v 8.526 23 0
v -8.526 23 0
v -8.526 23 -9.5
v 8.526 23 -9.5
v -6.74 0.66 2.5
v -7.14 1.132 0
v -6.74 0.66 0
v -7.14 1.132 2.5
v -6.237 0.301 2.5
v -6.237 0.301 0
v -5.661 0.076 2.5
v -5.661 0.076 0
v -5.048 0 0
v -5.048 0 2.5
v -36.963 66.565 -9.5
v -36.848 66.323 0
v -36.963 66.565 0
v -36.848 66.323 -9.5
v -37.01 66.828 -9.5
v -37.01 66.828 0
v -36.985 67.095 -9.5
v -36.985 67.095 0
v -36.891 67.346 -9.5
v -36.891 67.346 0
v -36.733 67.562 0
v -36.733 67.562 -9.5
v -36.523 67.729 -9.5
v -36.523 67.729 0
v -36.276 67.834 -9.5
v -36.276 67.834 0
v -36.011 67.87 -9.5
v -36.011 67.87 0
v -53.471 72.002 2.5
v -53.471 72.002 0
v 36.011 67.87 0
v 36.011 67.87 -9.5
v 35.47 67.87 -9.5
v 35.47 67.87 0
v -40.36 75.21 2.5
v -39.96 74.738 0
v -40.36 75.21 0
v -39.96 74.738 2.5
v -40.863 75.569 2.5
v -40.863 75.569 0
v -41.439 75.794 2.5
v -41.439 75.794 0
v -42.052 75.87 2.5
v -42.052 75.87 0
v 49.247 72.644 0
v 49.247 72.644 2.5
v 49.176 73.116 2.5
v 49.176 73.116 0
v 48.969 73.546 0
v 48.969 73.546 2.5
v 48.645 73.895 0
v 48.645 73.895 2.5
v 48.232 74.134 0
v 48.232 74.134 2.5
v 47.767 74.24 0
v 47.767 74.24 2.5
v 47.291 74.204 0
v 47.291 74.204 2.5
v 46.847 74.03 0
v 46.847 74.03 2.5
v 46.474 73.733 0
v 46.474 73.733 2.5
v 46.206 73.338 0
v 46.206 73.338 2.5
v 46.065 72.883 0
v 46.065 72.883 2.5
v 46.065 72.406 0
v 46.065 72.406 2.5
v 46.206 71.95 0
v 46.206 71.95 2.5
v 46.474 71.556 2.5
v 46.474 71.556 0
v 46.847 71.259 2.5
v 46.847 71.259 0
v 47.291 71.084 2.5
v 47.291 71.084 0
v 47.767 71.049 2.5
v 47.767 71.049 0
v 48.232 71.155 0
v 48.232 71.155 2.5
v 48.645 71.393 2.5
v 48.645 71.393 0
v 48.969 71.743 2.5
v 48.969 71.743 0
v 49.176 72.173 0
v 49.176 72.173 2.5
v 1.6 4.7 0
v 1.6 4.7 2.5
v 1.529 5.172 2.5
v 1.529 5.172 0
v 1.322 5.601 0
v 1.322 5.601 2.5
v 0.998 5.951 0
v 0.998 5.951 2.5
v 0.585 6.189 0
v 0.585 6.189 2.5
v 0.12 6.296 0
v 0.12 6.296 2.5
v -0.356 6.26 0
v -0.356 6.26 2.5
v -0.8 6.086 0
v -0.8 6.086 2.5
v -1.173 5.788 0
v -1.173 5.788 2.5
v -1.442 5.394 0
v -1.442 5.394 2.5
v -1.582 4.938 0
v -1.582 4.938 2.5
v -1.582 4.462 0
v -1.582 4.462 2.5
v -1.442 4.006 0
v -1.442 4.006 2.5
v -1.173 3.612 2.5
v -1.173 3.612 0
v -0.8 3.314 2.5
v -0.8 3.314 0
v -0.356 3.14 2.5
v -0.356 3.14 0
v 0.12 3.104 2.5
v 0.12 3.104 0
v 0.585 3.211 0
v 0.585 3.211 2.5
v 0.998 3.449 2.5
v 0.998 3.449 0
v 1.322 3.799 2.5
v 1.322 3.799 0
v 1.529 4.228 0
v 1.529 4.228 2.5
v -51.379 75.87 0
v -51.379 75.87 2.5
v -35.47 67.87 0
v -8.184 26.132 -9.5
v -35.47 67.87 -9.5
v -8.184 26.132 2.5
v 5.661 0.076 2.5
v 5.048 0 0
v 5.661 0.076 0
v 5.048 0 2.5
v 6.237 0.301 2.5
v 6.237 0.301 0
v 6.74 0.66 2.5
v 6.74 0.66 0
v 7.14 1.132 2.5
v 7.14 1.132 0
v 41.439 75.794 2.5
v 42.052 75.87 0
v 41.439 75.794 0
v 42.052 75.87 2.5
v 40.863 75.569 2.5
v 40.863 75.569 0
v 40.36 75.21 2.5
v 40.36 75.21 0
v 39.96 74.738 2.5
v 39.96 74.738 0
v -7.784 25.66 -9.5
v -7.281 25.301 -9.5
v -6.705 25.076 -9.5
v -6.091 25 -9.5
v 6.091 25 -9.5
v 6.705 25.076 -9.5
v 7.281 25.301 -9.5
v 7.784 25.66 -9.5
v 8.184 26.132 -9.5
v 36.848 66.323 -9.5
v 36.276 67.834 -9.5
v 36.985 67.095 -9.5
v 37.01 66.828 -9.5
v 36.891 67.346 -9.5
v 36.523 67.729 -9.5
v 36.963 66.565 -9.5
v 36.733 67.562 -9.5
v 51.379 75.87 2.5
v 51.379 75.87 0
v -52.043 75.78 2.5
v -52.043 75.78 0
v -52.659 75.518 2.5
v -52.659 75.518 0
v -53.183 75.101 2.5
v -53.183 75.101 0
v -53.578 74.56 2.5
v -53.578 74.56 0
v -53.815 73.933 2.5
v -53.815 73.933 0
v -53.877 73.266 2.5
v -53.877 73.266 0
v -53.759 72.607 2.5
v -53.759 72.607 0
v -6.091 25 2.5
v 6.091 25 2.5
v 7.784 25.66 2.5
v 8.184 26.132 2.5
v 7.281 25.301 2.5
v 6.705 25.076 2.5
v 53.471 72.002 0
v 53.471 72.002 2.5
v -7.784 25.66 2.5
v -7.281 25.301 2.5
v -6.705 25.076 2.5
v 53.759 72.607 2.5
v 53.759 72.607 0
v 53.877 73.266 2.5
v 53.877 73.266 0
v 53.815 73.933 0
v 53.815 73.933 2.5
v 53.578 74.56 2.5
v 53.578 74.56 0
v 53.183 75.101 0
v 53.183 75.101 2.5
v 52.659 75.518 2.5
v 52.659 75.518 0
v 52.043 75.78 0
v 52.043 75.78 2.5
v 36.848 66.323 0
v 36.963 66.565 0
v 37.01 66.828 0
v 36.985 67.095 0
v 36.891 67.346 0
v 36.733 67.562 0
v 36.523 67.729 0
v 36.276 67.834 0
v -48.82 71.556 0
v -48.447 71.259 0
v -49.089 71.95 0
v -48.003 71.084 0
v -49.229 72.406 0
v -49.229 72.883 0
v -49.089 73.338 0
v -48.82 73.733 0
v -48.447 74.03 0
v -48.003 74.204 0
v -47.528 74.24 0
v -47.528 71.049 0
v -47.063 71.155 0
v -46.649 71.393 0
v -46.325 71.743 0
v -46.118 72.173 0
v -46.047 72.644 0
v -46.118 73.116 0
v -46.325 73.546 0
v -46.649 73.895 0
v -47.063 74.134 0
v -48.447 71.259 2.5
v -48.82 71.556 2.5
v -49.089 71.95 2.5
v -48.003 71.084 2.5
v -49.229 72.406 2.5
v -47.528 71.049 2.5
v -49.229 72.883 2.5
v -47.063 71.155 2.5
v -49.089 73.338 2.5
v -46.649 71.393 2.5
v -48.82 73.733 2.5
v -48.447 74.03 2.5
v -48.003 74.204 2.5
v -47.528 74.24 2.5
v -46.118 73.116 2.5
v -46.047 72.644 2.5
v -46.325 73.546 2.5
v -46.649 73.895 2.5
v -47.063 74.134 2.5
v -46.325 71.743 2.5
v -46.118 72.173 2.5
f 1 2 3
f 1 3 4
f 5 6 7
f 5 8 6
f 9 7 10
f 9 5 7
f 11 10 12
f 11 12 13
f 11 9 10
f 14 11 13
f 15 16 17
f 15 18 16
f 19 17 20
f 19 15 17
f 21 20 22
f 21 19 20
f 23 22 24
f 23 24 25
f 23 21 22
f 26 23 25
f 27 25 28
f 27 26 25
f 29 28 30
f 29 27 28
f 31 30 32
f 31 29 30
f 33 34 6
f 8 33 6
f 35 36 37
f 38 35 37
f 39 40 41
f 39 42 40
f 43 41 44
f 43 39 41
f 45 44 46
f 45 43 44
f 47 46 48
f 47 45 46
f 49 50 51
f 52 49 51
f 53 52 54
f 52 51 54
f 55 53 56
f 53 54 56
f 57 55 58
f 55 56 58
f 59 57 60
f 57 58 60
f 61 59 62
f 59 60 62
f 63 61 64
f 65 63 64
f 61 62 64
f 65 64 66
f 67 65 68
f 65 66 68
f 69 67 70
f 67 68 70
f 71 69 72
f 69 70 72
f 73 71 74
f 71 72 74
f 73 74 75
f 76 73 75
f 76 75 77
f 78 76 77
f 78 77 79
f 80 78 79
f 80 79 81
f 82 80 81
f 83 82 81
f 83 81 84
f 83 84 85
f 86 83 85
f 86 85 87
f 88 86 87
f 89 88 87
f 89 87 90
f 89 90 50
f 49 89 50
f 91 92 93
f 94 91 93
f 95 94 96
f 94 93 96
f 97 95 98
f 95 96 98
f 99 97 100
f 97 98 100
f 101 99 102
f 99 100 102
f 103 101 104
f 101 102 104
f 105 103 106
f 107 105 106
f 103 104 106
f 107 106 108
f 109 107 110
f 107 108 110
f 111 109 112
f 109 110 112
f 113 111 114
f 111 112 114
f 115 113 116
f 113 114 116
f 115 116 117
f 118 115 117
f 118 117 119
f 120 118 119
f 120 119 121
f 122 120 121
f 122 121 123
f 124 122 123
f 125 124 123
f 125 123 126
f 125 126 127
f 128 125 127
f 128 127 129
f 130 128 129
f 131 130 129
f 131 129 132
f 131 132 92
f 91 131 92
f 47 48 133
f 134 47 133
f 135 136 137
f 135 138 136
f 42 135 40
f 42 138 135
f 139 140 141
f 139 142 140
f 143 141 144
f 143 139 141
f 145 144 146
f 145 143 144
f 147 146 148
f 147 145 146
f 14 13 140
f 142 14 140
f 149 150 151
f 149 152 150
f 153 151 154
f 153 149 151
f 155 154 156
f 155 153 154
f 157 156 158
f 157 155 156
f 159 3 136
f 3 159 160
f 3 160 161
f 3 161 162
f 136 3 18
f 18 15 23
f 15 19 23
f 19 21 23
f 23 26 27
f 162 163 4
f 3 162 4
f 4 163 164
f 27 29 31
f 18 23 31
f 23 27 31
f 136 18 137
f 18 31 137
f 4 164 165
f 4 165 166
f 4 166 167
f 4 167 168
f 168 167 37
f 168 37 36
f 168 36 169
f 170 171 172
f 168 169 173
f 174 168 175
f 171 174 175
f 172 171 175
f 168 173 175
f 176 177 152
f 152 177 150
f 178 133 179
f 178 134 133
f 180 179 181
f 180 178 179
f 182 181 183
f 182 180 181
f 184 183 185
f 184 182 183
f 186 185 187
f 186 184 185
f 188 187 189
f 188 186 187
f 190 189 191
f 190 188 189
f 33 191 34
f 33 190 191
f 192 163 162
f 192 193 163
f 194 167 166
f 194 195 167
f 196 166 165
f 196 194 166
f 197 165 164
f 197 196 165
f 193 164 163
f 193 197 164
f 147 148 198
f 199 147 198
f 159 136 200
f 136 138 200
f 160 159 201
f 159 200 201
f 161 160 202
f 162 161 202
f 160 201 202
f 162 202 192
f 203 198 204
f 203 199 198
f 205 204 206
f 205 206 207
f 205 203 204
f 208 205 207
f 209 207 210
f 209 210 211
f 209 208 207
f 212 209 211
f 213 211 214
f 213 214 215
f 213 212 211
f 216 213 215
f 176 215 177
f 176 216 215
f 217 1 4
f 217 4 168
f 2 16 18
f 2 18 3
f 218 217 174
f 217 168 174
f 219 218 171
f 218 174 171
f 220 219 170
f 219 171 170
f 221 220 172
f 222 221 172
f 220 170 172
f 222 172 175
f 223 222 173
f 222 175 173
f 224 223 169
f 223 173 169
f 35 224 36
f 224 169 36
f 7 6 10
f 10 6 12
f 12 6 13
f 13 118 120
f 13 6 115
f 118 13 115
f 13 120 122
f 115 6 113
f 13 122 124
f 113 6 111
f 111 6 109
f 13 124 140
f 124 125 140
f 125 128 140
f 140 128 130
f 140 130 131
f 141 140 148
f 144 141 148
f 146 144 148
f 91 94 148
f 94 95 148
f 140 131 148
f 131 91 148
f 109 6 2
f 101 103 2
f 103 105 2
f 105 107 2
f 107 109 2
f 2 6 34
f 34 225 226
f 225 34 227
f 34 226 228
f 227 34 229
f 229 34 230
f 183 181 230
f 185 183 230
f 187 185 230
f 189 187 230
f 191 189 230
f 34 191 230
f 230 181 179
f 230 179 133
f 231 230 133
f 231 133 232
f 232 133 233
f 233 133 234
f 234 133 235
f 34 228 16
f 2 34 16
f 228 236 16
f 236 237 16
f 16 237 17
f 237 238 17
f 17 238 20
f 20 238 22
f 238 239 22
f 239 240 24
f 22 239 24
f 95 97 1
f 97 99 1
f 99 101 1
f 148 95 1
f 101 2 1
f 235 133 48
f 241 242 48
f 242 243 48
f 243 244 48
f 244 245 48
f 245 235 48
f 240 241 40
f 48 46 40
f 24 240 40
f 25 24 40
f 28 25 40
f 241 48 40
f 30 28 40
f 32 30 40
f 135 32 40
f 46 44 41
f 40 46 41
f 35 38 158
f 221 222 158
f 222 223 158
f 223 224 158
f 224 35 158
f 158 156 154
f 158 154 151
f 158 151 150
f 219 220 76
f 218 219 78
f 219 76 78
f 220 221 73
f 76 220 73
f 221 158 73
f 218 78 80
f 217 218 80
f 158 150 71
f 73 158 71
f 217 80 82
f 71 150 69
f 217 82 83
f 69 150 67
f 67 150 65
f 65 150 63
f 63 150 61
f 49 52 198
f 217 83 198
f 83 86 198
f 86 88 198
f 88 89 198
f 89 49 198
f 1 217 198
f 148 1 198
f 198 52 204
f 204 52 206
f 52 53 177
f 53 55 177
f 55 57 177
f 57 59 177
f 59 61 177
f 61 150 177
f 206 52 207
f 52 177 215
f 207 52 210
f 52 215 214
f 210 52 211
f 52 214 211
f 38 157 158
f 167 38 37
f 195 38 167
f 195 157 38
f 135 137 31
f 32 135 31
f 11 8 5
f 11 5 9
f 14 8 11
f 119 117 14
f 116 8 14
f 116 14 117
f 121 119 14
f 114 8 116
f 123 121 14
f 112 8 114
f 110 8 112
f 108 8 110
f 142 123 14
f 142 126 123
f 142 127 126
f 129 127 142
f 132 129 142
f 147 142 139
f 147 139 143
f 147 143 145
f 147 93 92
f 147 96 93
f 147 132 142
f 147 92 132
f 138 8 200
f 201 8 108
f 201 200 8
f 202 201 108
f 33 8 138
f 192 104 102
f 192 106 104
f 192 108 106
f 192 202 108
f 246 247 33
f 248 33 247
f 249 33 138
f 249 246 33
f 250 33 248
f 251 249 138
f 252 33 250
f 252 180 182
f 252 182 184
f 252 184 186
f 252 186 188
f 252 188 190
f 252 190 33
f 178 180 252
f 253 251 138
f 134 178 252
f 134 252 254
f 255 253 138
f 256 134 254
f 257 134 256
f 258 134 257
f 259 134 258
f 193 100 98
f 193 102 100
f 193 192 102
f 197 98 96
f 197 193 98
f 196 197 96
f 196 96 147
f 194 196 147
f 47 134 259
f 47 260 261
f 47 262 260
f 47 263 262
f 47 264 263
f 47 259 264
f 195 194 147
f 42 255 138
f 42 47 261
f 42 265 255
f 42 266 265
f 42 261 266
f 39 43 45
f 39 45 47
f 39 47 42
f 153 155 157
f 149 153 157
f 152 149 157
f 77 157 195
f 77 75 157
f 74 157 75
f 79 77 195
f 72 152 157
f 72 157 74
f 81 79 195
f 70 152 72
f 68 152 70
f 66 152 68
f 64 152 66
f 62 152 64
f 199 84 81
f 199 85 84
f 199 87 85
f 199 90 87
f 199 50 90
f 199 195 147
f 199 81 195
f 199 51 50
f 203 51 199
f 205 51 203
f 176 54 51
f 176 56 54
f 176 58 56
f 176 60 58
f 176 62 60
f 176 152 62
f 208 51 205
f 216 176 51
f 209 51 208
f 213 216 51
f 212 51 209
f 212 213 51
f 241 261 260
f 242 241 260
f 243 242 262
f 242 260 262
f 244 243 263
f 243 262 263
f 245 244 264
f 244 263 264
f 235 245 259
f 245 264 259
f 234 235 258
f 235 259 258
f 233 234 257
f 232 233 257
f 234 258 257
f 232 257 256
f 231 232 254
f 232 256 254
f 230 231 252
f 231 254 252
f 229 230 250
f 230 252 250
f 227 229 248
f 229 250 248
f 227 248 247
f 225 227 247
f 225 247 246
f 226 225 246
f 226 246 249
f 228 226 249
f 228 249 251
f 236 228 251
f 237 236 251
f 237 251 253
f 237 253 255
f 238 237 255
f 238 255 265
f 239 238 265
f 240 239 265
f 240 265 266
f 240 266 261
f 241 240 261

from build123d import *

# Parameters (mm, degrees)
BOSS_EXTRU_1_DEPTH      = 2.5
ESQUISSE2_R             = 1.6
ENL_V_MAT_EXTRU_1_DEPTH = 3.5
BOSS_EXTRU_2_DEPTH      = 9.5
CONG_2_R                = 1
CONG_1_R                = 2.5
ESQUISSE4_R             = 1.6
ENL_V_MAT_EXTRU_2_DEPTH = 13


with BuildPart() as part:
    # Esquisse1 → Boss.-Extru.1 (new body)
    with BuildSketch(Plane.XY):
        Polygon((-6.4, 0), (6.11755814, 0), (6.4, 0), (56, 75.87), (40.7, 75.87), (7.443745881, 25), (-7.443745881, 25), (-40.7, 75.87), (-56, 75.87), align=None)
    extrude(amount=BOSS_EXTRU_1_DEPTH)

    # Esquisse2 → Enlèv. mat.-Extru.1 (cut, through all)
    with BuildSketch(Plane.XY.offset(2.5)):
        with Locations((0, 4.7)):
            Circle(ESQUISSE2_R)
    extrude(amount=-ENL_V_MAT_EXTRU_1_DEPTH, mode=Mode.SUBTRACT)

    # Esquisse3 → Boss.-Extru.2 (add)
    with BuildSketch(Plane(origin=(0, 0, 0), x_dir=(-1, 0, 0), z_dir=(0, 0, -1))):
        Polygon((-35.470001318, 67.87), (-7.443745881, 25), (7.443745881, 25), (35.470001318, 67.87), (37.859468913, 67.87), (8.525713806, 23), (-8.525713806, 23), (-37.859468913, 67.87), align=None)
    extrude(amount=BOSS_EXTRU_2_DEPTH)

    # Congé2
    cong_2_edges = [part.edges().sort_by_distance(p)[0] for p in [
        (37.859468913, 67.87, -4.75),
        (-37.859468913, 67.87, -4.75),
    ]]
    fillet(cong_2_edges, radius=CONG_2_R)

    # Congé1
    cong_1_edges = [part.edges().sort_by_distance(p)[0] for p in [
        (56, 75.87, 1.25),
        (6.4, 0, 1.25),
        (-6.4, 0, 1.25),
        (-56, 75.87, 1.25),
        (-40.7, 75.87, 1.25),
        (-7.443745881, 25, -3.5),
        (7.443745881, 25, -3.5),
        (40.7, 75.87, 1.25),
    ]]
    fillet(cong_1_edges, radius=CONG_1_R)

    # Esquisse4 → Enlèv. mat.-Extru.2 (cut, through all)
    with BuildSketch(Plane.XY.offset(2.5)):
        with Locations((47.647073462, 72.644280098)):
            Circle(ESQUISSE4_R)
        with Locations((-47.647073462, 72.644280098)):
            Circle(ESQUISSE4_R)
    extrude(amount=-ENL_V_MAT_EXTRU_2_DEPTH, mode=Mode.SUBTRACT)


solid = part.part
